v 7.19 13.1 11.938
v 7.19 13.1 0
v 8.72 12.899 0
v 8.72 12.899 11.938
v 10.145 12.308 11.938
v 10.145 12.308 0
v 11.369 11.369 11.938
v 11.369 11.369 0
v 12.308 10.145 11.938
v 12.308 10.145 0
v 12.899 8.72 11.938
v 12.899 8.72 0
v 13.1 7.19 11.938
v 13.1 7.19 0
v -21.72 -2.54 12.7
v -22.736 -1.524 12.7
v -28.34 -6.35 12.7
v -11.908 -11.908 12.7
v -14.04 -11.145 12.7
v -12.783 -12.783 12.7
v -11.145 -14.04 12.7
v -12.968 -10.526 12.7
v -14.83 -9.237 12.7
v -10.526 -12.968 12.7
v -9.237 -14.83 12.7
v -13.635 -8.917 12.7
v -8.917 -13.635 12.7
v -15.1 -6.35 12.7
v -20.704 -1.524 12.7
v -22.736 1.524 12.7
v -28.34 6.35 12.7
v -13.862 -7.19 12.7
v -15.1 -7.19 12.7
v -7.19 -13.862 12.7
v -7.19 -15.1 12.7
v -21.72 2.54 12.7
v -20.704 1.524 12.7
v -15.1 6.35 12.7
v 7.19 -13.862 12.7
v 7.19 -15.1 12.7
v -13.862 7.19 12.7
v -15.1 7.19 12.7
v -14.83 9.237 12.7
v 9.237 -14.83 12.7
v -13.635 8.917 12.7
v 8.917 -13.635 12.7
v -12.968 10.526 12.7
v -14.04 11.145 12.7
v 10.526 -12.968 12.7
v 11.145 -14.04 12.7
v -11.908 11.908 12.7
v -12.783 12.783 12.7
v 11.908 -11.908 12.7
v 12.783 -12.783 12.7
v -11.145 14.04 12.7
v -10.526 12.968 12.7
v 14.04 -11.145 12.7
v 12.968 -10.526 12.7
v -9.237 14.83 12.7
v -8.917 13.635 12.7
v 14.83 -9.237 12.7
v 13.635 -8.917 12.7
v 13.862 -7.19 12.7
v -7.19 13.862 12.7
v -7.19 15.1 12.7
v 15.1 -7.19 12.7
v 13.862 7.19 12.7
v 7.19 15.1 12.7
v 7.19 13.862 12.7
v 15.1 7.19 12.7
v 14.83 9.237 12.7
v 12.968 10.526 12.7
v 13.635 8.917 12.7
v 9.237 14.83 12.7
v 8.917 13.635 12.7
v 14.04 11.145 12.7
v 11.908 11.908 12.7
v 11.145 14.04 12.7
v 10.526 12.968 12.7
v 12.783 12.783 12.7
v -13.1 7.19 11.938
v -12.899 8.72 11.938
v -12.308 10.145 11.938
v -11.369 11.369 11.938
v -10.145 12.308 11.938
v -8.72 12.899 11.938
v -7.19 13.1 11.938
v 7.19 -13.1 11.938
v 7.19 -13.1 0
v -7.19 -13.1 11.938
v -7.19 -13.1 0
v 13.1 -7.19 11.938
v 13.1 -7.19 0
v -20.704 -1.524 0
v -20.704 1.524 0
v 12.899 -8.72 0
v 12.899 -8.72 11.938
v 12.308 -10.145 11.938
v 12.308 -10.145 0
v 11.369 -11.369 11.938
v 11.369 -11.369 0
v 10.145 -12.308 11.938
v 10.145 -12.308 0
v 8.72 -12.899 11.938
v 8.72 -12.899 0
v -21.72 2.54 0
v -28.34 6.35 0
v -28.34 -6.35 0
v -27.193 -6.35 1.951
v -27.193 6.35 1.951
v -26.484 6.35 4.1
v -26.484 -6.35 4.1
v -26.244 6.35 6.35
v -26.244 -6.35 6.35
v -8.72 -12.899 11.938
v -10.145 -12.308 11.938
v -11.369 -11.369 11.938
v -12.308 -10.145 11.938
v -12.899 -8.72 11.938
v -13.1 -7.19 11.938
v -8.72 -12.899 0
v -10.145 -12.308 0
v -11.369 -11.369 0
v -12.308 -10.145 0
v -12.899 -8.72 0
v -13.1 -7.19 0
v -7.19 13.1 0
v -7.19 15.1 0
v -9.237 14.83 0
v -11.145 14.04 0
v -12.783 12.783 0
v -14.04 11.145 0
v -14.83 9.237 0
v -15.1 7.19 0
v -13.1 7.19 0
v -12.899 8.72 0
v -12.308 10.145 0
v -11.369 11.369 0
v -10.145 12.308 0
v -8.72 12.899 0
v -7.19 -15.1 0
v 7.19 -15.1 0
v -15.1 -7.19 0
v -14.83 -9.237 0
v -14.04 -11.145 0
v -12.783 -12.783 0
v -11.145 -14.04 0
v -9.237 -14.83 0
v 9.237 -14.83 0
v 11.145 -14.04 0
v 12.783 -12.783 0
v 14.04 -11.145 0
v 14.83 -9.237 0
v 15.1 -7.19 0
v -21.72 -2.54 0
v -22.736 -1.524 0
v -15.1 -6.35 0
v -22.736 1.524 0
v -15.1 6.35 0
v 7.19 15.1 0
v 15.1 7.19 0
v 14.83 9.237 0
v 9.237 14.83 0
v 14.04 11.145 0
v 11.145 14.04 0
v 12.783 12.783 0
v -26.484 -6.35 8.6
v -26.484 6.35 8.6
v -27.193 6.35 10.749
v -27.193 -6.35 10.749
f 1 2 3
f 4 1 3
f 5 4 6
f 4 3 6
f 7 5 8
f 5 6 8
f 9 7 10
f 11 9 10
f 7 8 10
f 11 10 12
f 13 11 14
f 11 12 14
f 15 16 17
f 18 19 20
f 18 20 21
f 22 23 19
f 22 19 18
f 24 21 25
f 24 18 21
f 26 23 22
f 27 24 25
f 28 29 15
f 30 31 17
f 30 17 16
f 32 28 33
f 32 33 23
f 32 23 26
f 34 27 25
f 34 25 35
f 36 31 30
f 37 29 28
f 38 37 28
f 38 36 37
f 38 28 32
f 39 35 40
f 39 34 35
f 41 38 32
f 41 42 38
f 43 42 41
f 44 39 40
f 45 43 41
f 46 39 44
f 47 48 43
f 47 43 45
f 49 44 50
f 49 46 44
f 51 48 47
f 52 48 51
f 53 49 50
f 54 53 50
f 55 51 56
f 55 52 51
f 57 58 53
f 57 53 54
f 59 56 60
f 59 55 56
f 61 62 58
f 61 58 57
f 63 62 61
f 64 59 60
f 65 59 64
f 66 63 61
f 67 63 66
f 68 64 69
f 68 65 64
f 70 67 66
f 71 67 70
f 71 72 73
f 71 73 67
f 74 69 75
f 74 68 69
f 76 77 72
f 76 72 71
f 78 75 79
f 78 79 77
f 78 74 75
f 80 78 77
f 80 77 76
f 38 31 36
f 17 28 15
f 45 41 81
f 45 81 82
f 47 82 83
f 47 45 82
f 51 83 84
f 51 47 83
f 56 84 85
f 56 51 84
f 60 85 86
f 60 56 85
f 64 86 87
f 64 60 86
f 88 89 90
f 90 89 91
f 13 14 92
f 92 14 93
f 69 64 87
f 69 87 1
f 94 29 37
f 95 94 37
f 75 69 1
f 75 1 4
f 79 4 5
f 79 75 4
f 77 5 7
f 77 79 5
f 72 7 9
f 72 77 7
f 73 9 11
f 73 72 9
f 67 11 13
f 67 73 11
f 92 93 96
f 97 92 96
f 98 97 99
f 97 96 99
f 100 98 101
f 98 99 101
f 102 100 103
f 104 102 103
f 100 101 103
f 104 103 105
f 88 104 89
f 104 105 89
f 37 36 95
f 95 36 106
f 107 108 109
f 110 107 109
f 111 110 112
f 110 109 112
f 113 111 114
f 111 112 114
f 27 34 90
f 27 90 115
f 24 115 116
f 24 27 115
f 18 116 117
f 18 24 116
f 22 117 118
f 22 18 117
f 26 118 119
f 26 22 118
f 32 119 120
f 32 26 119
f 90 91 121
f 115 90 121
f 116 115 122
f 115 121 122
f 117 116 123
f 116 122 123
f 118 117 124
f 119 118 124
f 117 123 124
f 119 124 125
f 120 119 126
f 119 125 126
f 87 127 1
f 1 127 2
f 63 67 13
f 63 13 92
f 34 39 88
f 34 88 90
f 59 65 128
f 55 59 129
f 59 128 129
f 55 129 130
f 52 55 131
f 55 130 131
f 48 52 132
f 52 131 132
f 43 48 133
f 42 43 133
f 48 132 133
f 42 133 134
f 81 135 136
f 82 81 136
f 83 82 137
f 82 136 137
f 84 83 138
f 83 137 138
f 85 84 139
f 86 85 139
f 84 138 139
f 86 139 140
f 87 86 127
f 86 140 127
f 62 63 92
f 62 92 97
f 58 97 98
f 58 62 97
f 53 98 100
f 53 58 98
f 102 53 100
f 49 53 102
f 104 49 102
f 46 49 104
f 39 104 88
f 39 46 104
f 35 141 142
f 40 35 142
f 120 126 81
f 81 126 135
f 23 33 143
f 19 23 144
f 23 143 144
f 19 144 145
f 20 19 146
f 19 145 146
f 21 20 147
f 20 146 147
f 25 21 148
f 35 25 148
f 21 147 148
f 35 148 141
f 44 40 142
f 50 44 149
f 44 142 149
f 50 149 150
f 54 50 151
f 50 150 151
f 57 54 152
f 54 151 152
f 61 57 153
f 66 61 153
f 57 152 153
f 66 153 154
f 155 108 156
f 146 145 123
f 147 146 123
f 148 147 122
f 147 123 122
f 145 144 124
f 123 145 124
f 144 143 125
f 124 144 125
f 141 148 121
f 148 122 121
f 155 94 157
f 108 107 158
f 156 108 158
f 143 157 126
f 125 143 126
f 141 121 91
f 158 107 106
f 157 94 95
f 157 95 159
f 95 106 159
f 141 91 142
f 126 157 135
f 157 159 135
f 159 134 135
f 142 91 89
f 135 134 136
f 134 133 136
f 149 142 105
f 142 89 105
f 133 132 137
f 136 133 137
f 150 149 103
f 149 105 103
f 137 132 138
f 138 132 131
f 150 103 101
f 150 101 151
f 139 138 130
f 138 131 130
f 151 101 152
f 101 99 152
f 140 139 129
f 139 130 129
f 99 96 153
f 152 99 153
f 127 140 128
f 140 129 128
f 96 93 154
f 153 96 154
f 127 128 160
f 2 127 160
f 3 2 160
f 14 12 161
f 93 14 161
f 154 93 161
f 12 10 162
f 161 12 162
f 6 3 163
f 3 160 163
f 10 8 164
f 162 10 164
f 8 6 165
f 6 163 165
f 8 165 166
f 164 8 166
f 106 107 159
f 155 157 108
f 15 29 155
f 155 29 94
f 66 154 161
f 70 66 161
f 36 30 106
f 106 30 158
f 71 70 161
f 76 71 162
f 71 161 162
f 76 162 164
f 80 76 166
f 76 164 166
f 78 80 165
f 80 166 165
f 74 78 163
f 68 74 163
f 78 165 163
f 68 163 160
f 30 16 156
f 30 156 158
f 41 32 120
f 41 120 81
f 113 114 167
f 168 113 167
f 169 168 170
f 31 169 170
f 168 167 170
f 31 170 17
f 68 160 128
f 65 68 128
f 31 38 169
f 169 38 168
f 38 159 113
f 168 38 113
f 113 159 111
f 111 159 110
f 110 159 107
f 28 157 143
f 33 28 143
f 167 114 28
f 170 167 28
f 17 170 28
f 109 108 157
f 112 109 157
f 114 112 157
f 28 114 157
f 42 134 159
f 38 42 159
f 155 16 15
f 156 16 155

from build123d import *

# Parameters (mm, degrees)
F0_W     = 2
F0_H     = 12.7
F0_W_2   = 13.24
F1_DEPTH = 12.7
F3_DEPTH = 12.7
F4_W     = 2.032
F4_H     = 5.08
F5_DEPTH = 12.7
F6_SIZE  = 1.01599
F7_SIZE  = 0.762


# Not quite as in the source:
# - a fillet or chamfer is up to 0.001 mm smaller than in the source, because OpenCascade refuses the exact size


with BuildPart() as f1:
    # F0 (on Top) → F1 (new body)
    with BuildSketch(Plane.XY):
        with Locations((-14.1, 0)):
            Rectangle(F0_W, F0_H)
        with Locations((-21.72, 0)):
            Rectangle(F0_W_2, F0_H)
        with BuildLine():
            ThreePointArc((7.19, 13.1), (11.3690010768, 11.3690010768), (13.1, 7.19))
            Line((13.1, 7.19), (13.1, -7.19))
            ThreePointArc((13.1, -7.19), (11.3690010768, -11.3690010768), (7.19, -13.1))
            Line((7.19, -13.1), (-7.19, -13.1))
            ThreePointArc((-7.19, -13.1), (-11.3690010768, -11.3690010768), (-13.1, -7.19))
            Line((-13.1, -7.19), (-13.1, -6.35))
            Line((-13.1, -6.35), (-15.1, -6.35))
            Line((-15.1, -6.35), (-15.1, -7.19))
            ThreePointArc((-15.1, -7.19), (-12.7832146392, -12.7832146392), (-7.19, -15.1))
            Line((-7.19, -15.1), (7.19, -15.1))
            ThreePointArc((7.19, -15.1), (12.7832146392, -12.7832146392), (15.1, -7.19))
            Line((15.1, -7.19), (15.1, 7.19))
            ThreePointArc((15.1, 7.19), (12.7832146392, 12.7832146392), (7.19, 15.1))
            Line((7.19, 15.1), (-7.19, 15.1))
            ThreePointArc((-7.19, 15.1), (-12.7832146392, 12.7832146392), (-15.1, 7.19))
            Line((-15.1, 7.19), (-15.1, 6.35))
            Line((-15.1, 6.35), (-13.1, 6.35))
            Line((-13.1, 6.35), (-13.1, 7.19))
            ThreePointArc((-13.1, 7.19), (-11.3690010768, 11.3690010768), (-7.19, 13.1))
            Line((-7.19, 13.1), (7.19, 13.1))
        make_face()
    extrude(amount=F1_DEPTH)

    # F2 (on face) → F3 (cut, through all)
    with BuildSketch(Plane.XZ.offset(6.35)):
        with BuildLine():
            ThreePointArc((-28.34, 0), (-26.7817380481, 3.0065509582), (-26.2442648116, 6.35))
            ThreePointArc((-26.2442648116, 6.35), (-26.7817380481, 9.6934490418), (-28.34, 12.7))
            Line((-28.34, 12.7), (-28.34, 0))
        make_face()
    extrude(amount=-F3_DEPTH, mode=Mode.SUBTRACT)

    # F4 (on face) → F5 (cut, through all)
    with BuildSketch(Plane.XY.offset(12.7)):
        with Locations((-21.72, 0)):
            Rectangle(F4_W, F4_H)
    extrude(amount=-F5_DEPTH, mode=Mode.SUBTRACT)

    # F6 (size 1.016 in the source; OpenCascade refuses exactly that, so slightly less here)
    f6_edges = [f1.edges().sort_by_distance(p)[0] for p in [
        (-22.736, -2.54, 6.35),
        (-20.704, -2.54, 6.35),
        (-20.704, 2.54, 6.35),
        (-22.736, 2.54, 6.35),
    ]]
    chamfer(f6_edges, length=F6_SIZE)

    # F7
    f7_edges = [f1.edges().sort_by_distance(p)[0] for p in [
        (-11.369001, -11.369001, 12.7),
        (0, -13.1, 12.7),
        (-13.1, 0, 12.7),
        (-11.369001, 11.369001, 12.7),
        (0, 13.1, 12.7),
        (11.369001, 11.369001, 12.7),
        (13.1, 0, 12.7),
        (11.369001, -11.369001, 12.7),
    ]]
    chamfer(f7_edges, length=F7_SIZE)


solid = f1.part
